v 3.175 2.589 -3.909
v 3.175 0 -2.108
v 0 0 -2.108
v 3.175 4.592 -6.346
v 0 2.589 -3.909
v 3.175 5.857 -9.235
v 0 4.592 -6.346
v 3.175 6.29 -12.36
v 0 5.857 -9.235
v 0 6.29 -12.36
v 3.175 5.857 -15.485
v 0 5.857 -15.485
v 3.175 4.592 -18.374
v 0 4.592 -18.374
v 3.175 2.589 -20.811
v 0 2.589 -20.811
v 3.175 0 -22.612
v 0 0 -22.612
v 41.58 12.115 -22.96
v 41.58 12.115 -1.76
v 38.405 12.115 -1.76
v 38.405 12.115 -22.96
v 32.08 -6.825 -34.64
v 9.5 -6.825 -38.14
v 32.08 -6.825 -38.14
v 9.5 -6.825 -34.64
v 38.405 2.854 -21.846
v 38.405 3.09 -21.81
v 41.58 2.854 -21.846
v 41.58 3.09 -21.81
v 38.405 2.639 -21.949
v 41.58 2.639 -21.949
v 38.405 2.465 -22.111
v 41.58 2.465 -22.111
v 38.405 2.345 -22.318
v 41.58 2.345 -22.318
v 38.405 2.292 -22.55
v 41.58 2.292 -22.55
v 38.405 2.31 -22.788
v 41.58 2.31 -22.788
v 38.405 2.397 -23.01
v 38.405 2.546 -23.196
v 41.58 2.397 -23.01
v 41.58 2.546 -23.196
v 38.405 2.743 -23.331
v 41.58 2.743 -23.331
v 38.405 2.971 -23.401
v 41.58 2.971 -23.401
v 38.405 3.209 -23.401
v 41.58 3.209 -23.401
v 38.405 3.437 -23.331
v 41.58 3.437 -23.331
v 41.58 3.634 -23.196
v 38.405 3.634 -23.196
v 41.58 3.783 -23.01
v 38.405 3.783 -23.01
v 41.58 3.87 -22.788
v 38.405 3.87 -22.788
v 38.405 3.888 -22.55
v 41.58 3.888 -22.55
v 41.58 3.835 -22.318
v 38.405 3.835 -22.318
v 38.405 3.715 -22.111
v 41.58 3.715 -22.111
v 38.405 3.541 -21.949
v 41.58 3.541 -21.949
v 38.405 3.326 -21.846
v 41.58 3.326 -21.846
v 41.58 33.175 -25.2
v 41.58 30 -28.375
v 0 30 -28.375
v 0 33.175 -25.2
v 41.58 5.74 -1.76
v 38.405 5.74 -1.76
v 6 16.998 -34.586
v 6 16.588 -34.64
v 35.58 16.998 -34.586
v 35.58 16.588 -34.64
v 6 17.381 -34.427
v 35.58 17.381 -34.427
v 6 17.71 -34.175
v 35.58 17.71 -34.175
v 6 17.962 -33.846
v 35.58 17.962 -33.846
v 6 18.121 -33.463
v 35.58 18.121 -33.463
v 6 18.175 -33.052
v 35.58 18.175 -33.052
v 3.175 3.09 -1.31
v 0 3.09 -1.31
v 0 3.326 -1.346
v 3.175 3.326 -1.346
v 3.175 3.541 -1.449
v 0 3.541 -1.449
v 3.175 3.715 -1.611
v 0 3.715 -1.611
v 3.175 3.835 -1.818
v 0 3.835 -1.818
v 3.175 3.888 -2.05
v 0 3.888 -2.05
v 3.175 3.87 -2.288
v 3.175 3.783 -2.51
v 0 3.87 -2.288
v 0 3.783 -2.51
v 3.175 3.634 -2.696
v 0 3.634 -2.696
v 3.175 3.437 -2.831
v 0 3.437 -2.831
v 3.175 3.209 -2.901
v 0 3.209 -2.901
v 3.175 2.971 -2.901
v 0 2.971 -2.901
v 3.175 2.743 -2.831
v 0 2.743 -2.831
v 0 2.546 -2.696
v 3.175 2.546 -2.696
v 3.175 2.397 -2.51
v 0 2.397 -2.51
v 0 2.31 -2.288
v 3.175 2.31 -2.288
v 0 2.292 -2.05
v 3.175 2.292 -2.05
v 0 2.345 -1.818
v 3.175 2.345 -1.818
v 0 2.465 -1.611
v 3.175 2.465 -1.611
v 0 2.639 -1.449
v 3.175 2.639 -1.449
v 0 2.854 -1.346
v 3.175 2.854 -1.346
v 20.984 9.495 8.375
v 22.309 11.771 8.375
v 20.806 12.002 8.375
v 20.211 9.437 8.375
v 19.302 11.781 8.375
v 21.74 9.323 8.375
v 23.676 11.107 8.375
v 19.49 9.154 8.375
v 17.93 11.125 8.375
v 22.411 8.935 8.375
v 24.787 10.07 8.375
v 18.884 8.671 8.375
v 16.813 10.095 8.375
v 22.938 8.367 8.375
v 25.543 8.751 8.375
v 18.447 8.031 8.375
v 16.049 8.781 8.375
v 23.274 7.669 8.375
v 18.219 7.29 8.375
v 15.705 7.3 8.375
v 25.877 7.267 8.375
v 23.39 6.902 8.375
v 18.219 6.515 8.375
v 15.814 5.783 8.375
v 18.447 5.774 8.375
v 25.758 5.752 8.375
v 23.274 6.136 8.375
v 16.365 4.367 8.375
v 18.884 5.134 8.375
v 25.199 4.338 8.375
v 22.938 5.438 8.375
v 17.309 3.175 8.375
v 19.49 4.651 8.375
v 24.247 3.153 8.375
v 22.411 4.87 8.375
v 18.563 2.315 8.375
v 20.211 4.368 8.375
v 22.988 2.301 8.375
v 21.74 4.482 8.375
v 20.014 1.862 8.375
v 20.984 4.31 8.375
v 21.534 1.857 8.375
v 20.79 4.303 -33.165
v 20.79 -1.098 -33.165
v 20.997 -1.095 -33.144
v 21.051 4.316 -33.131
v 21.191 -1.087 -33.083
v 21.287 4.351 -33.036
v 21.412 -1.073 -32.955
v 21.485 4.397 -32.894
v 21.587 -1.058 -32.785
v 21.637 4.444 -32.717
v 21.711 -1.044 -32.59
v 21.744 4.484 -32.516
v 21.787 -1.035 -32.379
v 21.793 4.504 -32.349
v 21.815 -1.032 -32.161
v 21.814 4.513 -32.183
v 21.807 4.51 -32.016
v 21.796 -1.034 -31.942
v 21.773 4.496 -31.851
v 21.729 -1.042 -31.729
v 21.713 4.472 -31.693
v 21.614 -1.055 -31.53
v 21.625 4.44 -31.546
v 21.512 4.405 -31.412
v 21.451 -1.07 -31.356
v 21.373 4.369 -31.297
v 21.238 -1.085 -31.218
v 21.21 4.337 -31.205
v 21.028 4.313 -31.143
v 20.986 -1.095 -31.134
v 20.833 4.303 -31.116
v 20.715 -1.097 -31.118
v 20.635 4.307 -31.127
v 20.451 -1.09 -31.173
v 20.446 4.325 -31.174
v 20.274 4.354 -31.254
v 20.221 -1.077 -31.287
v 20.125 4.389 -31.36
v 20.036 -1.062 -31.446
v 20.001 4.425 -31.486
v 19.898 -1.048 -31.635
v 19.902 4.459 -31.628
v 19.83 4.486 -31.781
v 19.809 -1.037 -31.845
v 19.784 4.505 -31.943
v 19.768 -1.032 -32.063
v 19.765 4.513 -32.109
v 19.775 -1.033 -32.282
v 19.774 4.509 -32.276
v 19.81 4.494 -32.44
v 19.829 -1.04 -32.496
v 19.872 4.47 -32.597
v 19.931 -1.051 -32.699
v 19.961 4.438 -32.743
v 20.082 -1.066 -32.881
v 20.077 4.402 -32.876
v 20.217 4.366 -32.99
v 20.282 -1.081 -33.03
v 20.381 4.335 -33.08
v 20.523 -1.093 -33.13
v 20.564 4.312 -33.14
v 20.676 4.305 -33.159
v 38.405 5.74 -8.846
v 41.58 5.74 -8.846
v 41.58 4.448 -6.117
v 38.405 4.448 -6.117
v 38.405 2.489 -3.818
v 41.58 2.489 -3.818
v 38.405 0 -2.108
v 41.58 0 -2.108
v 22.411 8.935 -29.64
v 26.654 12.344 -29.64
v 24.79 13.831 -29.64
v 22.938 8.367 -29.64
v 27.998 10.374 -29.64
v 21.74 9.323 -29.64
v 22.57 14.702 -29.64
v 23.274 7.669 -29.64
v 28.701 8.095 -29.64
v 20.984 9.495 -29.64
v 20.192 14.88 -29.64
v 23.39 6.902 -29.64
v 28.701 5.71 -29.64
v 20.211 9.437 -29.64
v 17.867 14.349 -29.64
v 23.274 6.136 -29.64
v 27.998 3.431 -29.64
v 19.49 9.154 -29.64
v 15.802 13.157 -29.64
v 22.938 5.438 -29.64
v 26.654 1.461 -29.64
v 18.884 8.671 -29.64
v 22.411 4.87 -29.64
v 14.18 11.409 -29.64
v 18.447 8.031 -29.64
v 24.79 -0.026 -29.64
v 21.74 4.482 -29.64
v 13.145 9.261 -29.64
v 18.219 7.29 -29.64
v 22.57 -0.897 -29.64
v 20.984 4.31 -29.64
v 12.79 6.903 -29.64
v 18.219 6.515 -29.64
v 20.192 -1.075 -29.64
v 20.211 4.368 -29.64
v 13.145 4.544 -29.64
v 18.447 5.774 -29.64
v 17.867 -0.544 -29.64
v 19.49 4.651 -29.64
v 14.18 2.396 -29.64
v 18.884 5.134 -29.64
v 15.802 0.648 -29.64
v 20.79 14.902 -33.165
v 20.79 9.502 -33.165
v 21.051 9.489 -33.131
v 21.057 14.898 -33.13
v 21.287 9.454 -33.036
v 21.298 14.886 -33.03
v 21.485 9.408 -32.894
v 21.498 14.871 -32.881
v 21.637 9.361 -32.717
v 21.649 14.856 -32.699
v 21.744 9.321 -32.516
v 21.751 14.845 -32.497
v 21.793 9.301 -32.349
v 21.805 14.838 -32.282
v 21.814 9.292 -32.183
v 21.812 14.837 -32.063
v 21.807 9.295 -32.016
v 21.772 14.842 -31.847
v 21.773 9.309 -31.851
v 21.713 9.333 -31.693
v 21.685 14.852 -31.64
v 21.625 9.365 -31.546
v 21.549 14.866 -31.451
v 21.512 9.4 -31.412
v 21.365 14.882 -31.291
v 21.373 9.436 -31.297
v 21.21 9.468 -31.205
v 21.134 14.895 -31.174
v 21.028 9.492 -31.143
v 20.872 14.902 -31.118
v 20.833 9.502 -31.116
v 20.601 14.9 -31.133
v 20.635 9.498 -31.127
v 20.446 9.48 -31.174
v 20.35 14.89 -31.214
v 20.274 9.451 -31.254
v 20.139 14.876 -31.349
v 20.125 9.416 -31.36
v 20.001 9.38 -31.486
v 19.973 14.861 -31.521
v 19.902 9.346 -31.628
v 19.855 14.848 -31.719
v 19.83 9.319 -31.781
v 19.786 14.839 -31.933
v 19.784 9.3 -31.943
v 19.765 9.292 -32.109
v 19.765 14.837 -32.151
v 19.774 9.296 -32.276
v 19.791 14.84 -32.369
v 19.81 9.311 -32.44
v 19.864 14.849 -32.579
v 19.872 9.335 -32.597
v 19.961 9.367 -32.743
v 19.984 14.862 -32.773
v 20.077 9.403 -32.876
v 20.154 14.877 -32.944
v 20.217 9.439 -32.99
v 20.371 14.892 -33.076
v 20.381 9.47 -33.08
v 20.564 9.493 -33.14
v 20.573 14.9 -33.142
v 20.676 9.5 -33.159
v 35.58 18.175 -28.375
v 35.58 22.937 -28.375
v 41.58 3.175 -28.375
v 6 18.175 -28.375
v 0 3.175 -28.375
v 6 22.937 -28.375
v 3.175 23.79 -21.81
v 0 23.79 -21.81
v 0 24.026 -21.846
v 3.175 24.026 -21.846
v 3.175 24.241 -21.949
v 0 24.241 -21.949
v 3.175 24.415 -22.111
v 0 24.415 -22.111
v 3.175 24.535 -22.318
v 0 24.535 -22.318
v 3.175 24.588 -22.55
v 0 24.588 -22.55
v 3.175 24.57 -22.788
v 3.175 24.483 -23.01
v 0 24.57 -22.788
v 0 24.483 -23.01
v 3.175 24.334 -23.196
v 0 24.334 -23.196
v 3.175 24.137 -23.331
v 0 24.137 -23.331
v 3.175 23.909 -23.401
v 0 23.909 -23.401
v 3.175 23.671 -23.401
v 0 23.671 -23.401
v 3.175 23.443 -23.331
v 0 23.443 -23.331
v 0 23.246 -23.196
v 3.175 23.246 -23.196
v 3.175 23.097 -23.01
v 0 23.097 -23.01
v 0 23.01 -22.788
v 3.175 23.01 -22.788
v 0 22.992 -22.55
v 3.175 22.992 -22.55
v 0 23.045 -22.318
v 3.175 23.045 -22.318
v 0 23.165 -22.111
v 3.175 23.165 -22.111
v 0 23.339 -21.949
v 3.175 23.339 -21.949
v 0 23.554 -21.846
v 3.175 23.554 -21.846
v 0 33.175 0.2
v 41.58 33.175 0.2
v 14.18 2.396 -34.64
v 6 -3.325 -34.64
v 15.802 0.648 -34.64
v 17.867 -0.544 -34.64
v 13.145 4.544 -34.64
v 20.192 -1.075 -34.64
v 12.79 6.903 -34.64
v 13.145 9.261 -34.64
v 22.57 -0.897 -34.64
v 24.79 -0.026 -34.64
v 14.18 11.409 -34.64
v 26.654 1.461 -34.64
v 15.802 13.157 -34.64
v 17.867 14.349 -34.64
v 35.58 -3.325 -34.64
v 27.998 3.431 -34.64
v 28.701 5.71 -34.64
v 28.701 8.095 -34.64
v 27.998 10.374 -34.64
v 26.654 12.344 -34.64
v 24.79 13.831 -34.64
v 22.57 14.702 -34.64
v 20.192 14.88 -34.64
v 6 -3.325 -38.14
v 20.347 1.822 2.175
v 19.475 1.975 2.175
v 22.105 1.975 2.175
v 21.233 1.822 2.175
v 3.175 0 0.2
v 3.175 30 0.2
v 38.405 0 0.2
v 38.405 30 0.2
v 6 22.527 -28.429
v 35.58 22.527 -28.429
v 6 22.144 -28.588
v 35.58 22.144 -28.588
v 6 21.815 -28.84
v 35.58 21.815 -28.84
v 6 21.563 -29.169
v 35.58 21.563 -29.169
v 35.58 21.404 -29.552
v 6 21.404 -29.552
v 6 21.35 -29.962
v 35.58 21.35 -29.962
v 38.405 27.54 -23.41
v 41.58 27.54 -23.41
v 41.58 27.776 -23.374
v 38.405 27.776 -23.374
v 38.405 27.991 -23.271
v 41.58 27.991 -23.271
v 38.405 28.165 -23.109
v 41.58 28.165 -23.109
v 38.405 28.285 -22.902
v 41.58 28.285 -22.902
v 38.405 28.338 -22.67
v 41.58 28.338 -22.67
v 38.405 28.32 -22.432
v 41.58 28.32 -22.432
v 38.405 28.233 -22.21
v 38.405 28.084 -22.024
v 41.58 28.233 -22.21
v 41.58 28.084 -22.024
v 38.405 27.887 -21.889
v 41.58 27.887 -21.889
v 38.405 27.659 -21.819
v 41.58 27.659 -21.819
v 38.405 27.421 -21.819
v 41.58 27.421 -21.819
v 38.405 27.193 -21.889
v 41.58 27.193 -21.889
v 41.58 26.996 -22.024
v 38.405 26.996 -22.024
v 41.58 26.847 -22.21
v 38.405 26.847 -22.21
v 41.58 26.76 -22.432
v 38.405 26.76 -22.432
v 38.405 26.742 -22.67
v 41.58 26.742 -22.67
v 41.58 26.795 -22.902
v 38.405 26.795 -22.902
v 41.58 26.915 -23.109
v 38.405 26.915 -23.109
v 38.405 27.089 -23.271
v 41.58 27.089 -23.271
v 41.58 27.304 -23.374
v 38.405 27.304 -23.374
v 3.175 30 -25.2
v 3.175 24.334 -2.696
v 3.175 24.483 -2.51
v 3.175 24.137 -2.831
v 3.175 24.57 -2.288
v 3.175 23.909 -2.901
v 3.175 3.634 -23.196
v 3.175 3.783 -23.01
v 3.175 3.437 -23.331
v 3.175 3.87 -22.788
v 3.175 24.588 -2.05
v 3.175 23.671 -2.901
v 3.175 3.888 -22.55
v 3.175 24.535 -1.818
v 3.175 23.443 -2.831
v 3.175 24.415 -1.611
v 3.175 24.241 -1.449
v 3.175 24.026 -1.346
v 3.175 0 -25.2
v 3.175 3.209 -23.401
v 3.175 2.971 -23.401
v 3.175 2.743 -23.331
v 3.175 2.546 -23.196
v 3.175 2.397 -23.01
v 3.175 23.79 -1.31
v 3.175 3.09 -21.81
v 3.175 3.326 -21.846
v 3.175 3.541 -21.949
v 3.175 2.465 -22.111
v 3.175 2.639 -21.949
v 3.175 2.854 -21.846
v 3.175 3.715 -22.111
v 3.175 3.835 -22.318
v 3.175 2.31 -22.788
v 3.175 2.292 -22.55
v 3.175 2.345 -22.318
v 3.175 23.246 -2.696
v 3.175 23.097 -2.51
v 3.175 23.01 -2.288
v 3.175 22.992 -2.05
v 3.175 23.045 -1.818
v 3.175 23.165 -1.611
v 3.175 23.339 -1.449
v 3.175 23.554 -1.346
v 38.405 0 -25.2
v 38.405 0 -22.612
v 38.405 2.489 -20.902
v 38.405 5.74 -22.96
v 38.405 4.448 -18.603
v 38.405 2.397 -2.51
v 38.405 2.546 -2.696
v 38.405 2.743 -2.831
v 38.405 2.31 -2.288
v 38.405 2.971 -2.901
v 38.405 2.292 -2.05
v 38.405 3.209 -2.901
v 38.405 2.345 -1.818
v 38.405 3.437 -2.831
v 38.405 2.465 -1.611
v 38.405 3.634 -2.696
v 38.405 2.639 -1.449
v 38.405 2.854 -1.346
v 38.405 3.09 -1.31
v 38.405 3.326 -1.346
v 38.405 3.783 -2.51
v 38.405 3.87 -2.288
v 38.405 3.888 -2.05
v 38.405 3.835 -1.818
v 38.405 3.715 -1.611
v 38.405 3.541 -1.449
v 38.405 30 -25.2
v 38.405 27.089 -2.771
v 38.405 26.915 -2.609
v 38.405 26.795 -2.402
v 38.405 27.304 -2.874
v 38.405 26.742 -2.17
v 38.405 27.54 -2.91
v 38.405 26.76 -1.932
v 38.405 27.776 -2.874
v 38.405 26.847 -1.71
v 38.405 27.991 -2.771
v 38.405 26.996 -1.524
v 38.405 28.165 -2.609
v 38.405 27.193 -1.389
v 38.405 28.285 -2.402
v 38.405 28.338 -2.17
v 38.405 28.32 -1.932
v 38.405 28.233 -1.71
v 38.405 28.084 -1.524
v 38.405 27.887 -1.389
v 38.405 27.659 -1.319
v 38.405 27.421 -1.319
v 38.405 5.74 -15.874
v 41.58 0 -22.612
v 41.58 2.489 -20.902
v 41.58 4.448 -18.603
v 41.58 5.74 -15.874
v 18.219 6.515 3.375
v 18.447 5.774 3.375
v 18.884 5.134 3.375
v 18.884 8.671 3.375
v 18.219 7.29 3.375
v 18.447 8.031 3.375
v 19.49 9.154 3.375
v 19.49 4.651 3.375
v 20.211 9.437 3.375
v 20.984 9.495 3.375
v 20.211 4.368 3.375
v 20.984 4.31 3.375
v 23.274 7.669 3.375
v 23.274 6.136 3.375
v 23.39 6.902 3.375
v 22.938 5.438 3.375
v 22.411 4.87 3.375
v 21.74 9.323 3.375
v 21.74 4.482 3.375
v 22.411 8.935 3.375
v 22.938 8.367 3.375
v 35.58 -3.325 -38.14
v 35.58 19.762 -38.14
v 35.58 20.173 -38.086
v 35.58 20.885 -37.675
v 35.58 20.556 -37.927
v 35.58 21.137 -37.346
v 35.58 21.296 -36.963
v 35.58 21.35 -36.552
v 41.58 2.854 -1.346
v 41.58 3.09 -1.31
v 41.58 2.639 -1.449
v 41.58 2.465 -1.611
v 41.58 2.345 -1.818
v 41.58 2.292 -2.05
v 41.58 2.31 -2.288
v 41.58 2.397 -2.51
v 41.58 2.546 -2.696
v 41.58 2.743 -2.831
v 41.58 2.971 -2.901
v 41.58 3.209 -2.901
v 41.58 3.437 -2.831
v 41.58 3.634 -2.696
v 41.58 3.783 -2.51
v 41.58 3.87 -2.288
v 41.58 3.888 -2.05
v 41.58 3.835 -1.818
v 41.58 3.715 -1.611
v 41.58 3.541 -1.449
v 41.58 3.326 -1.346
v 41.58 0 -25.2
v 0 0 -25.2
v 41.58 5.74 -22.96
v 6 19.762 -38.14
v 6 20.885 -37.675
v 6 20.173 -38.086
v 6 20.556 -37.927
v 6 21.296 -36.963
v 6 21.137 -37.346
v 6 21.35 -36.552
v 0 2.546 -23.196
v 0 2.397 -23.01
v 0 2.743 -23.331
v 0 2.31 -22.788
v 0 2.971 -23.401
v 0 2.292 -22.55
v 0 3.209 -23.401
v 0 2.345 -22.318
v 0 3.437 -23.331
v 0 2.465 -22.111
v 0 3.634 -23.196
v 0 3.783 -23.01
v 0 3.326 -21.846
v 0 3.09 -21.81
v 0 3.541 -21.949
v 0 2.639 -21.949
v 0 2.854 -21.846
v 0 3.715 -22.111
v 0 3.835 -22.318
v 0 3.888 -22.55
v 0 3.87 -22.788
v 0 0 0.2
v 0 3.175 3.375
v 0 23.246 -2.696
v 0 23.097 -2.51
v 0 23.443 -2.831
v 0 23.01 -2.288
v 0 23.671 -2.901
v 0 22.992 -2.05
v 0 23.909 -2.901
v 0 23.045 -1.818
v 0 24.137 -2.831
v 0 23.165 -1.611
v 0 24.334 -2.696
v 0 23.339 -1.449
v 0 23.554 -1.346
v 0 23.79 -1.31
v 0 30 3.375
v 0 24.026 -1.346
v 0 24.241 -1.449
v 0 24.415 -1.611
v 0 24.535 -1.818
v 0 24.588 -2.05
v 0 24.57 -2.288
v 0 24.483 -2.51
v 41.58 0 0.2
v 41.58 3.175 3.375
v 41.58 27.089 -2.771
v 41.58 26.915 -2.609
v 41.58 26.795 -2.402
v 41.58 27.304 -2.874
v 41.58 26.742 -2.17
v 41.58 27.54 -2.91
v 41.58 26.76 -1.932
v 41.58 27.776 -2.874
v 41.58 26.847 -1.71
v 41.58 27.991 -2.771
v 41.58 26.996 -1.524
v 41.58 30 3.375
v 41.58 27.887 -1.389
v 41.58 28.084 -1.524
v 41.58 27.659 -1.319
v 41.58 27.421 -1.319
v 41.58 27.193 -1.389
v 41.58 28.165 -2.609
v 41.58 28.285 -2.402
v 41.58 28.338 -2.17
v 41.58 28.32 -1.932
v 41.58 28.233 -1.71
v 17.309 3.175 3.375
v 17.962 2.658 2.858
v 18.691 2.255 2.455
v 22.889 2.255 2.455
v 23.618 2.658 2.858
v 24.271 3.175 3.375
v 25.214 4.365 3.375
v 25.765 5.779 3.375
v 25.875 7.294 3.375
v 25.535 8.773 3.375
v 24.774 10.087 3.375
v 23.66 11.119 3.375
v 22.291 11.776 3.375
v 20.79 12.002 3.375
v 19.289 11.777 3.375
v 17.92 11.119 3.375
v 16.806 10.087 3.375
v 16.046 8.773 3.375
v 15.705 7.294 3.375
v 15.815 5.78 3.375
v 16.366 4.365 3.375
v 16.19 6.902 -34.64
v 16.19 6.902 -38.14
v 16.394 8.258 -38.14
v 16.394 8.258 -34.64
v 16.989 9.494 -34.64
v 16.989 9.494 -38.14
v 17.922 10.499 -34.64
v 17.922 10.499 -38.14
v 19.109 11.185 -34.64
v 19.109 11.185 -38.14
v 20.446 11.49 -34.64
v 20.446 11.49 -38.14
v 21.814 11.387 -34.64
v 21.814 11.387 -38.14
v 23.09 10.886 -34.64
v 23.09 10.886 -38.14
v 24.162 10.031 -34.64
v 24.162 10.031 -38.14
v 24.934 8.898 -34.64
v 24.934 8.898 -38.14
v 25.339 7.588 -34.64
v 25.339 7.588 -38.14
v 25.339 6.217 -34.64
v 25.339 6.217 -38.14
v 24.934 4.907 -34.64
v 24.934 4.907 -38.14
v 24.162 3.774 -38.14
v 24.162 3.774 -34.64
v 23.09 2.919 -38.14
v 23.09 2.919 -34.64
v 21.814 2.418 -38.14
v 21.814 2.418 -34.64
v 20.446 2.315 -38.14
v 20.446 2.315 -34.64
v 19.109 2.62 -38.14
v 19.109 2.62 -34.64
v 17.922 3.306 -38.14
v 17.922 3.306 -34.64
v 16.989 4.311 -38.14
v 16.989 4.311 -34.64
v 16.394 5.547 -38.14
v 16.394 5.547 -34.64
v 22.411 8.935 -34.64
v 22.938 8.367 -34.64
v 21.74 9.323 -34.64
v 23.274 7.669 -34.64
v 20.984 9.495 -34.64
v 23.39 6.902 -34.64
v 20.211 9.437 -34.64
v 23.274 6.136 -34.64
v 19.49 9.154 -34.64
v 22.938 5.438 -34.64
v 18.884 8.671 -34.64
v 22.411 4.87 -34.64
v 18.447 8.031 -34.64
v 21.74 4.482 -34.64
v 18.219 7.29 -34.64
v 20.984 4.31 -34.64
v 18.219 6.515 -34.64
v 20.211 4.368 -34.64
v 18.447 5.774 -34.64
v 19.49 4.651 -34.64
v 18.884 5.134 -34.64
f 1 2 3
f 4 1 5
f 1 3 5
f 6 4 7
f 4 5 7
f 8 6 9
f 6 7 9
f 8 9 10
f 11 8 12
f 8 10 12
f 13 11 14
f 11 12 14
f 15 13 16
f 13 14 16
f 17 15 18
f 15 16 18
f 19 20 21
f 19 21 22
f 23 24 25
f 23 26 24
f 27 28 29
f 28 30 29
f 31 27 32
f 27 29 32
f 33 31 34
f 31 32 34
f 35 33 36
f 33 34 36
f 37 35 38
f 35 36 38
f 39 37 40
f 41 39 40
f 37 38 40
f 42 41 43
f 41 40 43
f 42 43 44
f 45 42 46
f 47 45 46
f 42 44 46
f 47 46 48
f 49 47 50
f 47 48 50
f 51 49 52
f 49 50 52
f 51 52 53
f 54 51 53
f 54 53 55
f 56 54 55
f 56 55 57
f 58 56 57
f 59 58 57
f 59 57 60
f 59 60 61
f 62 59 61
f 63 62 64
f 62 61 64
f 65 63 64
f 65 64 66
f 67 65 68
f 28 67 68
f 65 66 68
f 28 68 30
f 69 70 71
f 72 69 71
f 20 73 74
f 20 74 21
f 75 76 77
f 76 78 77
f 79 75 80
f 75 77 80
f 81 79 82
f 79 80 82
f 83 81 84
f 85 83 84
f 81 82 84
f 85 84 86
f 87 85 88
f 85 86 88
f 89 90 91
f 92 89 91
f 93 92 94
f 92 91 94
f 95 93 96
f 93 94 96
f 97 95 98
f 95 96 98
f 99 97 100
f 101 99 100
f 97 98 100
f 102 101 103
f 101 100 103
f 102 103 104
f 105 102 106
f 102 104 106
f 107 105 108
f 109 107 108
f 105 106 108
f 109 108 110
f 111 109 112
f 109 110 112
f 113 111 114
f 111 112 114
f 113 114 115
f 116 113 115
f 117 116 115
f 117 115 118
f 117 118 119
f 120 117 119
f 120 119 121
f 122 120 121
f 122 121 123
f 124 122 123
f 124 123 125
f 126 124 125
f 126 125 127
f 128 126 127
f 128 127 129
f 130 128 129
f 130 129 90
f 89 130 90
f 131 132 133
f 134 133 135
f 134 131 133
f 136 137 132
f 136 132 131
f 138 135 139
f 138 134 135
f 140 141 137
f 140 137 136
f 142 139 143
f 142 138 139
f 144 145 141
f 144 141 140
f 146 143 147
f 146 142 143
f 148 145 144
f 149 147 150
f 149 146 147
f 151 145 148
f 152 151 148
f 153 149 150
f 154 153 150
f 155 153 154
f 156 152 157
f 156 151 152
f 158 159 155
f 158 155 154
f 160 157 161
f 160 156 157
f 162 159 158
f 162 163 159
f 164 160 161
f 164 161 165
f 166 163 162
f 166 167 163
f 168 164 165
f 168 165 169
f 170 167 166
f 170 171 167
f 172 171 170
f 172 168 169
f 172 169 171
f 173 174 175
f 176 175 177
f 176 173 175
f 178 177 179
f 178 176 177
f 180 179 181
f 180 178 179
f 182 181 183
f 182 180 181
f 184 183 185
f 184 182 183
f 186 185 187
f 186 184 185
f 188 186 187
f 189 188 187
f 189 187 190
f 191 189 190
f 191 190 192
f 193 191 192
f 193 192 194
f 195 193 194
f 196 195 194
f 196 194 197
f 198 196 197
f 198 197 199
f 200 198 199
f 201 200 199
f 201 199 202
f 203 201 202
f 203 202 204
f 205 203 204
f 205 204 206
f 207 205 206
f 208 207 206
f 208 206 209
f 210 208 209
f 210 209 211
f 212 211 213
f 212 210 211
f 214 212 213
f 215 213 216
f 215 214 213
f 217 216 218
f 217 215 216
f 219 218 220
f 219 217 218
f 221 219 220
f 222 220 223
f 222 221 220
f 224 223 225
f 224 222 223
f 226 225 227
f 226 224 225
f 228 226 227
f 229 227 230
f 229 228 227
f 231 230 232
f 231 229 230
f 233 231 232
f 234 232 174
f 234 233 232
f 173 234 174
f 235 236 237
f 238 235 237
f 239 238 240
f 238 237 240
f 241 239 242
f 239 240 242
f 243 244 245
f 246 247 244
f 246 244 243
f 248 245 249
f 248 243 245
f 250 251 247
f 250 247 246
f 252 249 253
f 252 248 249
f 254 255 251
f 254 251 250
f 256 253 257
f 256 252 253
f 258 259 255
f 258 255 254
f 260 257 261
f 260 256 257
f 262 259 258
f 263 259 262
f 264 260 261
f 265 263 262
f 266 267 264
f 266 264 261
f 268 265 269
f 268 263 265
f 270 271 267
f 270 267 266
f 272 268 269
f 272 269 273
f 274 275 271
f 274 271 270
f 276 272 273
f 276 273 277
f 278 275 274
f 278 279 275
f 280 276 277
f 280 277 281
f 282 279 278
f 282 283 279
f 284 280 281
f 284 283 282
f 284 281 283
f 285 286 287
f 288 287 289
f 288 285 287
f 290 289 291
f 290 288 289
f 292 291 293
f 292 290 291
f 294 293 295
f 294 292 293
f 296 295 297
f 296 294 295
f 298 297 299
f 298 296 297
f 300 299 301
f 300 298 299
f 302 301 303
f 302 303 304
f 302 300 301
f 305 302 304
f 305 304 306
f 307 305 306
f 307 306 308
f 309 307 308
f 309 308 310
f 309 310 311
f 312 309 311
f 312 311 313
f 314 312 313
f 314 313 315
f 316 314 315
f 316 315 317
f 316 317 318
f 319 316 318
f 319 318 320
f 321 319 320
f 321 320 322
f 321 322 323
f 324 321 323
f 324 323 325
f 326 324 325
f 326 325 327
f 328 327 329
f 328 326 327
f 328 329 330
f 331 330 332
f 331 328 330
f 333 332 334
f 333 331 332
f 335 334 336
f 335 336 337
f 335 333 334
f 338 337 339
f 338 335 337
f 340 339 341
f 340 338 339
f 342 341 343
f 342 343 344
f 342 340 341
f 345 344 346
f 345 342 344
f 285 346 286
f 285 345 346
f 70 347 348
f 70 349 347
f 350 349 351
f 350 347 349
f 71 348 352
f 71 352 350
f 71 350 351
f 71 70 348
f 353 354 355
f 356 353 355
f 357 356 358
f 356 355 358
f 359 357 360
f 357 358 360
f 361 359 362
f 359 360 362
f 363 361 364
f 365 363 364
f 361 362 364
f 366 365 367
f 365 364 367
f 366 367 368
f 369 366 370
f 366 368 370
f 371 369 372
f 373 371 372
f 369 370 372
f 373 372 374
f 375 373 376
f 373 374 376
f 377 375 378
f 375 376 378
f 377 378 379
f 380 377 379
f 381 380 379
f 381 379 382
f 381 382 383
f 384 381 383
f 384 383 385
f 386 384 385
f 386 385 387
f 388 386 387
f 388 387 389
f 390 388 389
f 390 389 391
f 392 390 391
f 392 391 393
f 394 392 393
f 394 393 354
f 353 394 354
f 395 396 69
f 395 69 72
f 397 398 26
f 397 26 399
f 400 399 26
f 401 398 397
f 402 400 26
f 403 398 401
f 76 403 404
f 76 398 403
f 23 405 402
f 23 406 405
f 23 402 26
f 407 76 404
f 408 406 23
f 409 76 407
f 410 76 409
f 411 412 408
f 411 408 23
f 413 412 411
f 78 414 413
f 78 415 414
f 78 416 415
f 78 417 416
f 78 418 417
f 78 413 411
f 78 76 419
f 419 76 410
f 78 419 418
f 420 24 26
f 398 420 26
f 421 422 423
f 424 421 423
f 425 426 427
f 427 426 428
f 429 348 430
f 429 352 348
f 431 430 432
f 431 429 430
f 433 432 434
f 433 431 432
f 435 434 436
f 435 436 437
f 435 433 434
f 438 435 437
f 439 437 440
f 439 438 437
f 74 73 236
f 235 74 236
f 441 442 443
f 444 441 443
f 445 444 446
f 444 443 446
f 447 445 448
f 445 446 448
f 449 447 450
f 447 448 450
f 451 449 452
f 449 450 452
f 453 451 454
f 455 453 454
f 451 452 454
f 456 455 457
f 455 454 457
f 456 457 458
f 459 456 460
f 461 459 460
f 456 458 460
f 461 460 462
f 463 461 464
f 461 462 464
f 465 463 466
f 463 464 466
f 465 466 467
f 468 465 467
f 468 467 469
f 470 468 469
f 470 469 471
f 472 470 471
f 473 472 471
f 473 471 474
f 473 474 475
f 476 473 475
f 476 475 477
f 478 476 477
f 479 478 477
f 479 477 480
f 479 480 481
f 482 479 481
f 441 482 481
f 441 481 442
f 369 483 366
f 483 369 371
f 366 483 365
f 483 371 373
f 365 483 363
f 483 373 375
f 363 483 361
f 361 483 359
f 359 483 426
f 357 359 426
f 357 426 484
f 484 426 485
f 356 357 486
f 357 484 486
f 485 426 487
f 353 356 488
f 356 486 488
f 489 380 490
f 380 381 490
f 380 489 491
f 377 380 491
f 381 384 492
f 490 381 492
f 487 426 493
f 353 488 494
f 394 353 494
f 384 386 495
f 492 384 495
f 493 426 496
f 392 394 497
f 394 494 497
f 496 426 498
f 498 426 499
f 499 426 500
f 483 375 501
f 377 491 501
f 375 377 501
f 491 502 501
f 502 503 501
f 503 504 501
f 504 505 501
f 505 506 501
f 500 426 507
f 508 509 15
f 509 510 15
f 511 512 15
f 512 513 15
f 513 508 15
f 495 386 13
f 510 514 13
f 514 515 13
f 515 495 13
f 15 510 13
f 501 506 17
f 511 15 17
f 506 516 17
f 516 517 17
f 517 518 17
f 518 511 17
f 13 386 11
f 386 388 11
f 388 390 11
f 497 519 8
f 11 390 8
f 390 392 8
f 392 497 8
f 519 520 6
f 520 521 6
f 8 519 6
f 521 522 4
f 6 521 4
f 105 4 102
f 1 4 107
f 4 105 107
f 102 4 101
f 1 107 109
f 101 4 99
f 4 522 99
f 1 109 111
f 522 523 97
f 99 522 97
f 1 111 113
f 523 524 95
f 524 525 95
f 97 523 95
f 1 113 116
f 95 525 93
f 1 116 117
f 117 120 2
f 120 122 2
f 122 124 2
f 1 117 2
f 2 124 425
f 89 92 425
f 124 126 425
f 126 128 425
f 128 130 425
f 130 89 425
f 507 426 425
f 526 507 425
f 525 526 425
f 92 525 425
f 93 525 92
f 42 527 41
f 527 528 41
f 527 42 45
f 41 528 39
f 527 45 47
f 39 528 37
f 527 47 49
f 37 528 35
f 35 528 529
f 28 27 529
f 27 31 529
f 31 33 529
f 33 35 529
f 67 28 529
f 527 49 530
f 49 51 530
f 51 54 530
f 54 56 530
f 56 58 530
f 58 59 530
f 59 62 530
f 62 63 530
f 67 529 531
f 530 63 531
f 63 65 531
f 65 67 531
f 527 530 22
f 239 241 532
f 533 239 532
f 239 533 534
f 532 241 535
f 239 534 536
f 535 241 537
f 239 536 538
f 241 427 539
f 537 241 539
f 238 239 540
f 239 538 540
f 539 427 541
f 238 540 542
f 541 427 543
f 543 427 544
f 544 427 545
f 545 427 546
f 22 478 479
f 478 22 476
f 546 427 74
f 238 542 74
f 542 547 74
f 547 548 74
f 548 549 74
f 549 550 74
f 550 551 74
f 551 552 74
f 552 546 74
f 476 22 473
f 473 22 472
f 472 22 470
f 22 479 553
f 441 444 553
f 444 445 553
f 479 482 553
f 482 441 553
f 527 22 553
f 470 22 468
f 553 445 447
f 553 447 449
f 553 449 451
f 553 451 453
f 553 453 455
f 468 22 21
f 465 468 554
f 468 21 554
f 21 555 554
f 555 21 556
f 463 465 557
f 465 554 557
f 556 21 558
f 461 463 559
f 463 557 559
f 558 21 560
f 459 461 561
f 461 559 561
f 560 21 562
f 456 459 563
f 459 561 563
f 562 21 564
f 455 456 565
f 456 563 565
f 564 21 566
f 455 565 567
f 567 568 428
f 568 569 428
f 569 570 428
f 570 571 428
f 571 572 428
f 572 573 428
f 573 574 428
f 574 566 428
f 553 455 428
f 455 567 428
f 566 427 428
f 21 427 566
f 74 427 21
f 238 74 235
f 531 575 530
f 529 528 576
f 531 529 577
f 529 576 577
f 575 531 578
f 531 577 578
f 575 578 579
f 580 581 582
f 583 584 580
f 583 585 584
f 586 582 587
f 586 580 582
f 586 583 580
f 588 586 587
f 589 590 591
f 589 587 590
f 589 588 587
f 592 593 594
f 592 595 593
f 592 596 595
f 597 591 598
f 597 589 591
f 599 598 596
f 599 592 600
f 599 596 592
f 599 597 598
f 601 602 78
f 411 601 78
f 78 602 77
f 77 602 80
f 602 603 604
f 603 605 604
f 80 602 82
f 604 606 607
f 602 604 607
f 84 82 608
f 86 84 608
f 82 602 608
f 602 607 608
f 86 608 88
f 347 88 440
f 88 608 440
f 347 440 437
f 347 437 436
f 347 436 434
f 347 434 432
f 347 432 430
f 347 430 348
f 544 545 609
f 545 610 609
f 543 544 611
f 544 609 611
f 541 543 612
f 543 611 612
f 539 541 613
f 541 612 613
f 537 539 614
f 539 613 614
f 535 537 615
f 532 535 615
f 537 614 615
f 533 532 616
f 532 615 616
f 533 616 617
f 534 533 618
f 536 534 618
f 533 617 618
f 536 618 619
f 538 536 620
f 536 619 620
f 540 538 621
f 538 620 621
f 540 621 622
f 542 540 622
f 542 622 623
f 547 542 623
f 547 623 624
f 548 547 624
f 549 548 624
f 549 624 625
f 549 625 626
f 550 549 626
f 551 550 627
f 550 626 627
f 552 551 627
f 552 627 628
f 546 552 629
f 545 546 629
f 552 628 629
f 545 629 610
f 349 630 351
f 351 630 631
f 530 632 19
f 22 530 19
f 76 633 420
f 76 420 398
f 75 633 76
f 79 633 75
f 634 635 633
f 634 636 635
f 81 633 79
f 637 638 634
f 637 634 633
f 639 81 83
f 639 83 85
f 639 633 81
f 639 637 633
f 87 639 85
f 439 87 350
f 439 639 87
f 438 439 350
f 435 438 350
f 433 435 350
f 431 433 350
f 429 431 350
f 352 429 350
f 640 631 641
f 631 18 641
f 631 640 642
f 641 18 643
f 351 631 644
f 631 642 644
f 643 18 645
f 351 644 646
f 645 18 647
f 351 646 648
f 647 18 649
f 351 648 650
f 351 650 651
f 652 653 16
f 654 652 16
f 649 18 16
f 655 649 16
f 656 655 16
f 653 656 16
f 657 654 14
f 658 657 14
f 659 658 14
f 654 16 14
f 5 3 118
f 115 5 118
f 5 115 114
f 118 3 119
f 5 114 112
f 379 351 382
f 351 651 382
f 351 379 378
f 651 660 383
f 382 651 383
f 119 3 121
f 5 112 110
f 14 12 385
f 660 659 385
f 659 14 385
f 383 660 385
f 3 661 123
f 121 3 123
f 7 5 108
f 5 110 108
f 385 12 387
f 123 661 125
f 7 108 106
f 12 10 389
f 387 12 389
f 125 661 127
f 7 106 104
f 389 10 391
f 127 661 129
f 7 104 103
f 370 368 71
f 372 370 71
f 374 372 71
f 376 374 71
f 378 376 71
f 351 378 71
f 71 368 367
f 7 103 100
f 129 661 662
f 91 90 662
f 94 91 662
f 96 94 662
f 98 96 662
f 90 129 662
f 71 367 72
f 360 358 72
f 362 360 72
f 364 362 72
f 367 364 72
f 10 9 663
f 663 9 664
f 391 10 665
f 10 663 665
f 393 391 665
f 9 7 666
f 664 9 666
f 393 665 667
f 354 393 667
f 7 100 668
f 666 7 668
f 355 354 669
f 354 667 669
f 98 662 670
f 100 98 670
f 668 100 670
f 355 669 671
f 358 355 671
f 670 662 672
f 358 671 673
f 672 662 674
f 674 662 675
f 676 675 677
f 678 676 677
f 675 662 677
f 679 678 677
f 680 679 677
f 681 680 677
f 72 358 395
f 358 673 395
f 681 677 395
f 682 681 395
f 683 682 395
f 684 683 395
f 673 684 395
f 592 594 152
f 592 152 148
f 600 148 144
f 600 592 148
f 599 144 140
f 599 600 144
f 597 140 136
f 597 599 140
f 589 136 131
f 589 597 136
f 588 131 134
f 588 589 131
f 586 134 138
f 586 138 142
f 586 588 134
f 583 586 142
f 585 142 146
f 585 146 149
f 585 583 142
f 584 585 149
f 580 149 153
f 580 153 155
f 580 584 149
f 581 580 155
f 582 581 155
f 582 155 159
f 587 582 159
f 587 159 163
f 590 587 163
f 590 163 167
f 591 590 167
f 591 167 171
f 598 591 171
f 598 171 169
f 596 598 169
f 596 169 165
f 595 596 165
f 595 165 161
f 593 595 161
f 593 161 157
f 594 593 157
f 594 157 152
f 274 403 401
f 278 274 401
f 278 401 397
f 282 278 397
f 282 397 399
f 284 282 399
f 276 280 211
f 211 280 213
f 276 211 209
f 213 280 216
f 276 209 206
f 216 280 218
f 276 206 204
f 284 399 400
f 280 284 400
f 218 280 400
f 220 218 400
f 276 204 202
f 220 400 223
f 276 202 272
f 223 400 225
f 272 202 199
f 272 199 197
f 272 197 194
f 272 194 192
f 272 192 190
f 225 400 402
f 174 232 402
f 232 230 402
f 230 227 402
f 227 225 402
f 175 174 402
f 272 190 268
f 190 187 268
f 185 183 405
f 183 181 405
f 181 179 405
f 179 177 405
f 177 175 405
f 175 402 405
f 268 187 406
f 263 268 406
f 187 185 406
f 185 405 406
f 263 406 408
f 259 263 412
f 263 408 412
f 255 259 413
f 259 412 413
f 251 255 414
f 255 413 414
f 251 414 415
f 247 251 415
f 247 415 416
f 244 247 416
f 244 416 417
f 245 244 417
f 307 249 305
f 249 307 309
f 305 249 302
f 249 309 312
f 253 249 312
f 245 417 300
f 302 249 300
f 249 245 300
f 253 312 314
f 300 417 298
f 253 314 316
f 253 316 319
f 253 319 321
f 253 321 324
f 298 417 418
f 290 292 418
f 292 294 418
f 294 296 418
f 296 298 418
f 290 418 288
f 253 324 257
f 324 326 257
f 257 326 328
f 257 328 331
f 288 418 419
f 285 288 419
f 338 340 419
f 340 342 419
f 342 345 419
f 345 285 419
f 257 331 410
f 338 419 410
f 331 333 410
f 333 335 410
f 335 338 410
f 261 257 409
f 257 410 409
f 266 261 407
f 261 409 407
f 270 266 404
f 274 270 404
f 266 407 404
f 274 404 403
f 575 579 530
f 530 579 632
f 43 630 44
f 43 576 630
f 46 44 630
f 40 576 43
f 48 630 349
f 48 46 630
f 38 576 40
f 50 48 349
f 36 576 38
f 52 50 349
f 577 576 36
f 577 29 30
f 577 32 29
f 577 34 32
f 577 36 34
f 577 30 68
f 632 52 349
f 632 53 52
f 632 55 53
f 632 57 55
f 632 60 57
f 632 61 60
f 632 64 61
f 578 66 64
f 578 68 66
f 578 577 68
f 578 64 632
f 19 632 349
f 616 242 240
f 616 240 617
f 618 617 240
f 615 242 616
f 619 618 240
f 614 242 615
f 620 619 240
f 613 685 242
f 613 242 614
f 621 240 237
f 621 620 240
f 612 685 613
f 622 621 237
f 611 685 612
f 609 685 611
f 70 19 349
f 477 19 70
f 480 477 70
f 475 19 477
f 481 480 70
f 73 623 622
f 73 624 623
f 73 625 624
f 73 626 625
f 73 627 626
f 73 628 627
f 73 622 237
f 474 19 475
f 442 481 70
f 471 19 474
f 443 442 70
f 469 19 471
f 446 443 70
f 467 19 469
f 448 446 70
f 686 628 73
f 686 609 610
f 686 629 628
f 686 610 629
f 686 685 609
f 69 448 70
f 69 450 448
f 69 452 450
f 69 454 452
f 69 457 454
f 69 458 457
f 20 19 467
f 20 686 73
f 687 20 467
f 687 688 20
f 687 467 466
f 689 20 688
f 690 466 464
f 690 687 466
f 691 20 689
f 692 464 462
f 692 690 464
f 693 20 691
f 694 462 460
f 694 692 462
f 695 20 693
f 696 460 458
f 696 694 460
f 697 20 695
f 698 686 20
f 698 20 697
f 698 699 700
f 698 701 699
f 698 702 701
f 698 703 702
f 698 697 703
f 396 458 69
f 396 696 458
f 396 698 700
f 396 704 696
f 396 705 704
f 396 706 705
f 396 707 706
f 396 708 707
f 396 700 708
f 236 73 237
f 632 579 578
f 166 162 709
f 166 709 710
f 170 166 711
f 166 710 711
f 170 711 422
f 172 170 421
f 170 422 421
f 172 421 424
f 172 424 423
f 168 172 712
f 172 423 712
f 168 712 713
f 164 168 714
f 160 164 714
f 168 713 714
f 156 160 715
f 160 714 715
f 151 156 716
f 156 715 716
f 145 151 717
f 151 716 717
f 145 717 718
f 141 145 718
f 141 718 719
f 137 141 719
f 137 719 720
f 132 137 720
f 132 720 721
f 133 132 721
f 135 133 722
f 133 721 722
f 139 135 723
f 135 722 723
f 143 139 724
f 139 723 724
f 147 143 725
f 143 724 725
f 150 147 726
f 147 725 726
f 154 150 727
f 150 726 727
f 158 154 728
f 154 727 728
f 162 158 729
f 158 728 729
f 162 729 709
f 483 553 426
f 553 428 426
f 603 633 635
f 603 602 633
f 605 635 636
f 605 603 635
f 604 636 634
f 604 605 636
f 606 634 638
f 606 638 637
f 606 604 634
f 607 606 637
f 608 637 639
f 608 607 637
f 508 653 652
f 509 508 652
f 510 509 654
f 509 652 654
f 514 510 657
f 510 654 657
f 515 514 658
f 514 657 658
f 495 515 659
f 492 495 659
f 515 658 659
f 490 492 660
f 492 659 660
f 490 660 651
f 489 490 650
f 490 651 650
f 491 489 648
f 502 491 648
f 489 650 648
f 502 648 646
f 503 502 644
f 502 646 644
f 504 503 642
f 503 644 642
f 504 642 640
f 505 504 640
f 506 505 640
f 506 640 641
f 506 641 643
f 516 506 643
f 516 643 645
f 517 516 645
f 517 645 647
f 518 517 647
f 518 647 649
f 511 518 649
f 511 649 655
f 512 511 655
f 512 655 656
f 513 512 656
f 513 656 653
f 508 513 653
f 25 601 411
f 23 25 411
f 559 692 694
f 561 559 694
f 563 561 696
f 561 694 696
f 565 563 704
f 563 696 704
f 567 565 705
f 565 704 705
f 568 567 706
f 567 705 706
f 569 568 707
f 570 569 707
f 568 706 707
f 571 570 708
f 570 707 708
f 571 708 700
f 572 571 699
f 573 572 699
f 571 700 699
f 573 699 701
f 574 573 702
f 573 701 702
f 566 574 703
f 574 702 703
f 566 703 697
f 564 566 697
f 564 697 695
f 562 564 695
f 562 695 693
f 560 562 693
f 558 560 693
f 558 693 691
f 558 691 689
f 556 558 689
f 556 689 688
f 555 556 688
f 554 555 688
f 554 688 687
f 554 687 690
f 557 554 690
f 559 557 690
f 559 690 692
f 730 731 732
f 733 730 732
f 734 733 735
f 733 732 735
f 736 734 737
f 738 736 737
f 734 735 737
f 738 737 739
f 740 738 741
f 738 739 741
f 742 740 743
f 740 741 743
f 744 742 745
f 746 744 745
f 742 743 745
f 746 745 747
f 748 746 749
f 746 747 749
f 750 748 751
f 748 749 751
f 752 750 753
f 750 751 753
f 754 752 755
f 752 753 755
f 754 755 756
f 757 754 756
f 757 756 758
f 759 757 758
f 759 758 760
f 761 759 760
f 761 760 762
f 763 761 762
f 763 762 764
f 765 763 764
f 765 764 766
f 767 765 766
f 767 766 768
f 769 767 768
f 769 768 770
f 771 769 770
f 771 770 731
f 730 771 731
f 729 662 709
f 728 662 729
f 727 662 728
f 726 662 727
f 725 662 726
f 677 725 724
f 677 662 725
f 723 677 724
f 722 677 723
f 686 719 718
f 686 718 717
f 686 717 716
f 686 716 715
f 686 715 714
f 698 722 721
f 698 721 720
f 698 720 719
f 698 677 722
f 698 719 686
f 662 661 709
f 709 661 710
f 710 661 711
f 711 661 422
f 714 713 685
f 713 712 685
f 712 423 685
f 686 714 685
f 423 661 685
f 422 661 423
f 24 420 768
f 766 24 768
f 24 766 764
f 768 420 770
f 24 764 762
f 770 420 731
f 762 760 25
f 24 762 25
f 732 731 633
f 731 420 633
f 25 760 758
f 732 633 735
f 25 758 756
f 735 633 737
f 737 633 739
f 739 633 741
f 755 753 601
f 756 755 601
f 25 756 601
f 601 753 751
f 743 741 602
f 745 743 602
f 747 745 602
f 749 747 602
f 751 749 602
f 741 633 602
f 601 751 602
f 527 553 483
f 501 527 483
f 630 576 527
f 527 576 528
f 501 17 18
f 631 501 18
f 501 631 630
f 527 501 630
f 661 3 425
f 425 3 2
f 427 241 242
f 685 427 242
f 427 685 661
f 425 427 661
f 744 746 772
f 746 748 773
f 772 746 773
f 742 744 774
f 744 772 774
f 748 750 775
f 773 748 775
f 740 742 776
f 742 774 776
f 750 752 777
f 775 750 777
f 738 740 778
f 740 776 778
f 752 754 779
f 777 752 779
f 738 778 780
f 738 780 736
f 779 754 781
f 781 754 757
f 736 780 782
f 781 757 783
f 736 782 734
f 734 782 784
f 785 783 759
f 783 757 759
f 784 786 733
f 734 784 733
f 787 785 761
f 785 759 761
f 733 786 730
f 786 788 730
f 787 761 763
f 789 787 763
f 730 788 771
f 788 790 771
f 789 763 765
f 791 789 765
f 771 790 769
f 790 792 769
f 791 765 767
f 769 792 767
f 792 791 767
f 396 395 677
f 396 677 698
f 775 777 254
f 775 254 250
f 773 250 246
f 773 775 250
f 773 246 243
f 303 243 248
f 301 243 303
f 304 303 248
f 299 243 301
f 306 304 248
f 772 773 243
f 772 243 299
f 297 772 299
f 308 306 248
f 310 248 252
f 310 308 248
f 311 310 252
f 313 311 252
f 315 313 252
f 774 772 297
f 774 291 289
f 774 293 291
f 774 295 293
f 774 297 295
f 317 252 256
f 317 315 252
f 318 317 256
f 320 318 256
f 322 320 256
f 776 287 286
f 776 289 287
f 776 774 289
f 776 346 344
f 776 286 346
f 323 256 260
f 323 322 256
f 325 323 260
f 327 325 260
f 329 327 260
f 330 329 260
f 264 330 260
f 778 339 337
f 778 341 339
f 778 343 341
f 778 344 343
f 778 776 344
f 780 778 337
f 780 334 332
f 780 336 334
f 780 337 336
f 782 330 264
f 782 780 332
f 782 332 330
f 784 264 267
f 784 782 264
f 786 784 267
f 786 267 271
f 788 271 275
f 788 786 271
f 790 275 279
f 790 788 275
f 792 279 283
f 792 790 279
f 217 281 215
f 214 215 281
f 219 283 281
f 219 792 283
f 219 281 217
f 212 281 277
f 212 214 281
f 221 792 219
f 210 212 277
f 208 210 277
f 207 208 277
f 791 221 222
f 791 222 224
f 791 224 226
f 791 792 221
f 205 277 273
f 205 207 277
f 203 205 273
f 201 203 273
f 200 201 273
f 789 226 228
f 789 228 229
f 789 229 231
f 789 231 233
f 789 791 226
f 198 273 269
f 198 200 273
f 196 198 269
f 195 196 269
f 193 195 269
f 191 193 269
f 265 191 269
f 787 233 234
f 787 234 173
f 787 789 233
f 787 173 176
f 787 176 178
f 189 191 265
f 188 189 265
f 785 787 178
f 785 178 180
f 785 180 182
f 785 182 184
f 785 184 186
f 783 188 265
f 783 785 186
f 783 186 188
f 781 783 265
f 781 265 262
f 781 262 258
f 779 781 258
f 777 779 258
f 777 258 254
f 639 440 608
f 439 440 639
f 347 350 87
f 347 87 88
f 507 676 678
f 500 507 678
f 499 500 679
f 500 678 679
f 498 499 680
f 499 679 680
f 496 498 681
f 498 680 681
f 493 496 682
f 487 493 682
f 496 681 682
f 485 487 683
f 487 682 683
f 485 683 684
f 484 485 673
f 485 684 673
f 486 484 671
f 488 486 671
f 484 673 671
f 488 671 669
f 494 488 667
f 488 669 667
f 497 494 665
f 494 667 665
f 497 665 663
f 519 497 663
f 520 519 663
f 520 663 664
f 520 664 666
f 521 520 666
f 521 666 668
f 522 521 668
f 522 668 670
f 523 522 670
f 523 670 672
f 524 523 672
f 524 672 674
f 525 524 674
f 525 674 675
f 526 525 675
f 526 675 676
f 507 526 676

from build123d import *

# Parameters (mm, degrees)
SKETCH1_W                       = 25
SKETCH1_H                       = 30
BOSS_EXTRUDE1_DEPTH             = 3.175
SKETCH2_W                       = 25
SKETCH2_H                       = 3.175
BOSS_EXTRUDE2_DEPTH             = 41.58
SKETCH3_W                       = 3.175
SKETCH3_H                       = 25
BOSS_EXTRUDE3_DEPTH             = 30
CUT_EXTRUDE1_REACH              = 60.775
SKETCH4_R                       = 11.5
CUT_EXTRUDE2_REACH              = 60.775
SKETCH5_R                       = 0.8
CUT_EXTRUDE3_REACH              = 60.775
SKETCH6_R                       = 0.8
SKETCH6_R_2                     = 0.799851166
SKETCH6_W                       = 21.2
SKETCH6_H                       = 6.375
CUT_EXTRUDE4_REACH              = 60.775
SKETCH7_R                       = 11.5
BOSS_EXTRUDE4_DEPTH             = 0.2
SKETCH9_W                       = 41.58
SKETCH9_H                       = 33.175
BOSS_EXTRUDE5_DEPTH             = 3.175
BOSS_EXTRUDE6_DEPTH             = 0.2
SKETCH11_W                      = 41.58
SKETCH11_H                      = 33.175
BOSS_EXTRUDE7_DEPTH             = 3.175
CHAMFER1_SIZE                   = 3.175
CHAMFER2_SIZE                   = 3.175
SKETCH13_W                      = 29.58
SKETCH13_H                      = 3.175
BOSS_EXTRUDE8_DEPTH             = 6.59
BOSS_EXTRUDE9_REACH             = 59.287
SKETCH14_W                      = 29.58
SKETCH14_H                      = 3.5
BOSS_EXTRUDE9_DIRECTION_2_DEPTH = 25
CHAMFER3_SIZE                   = 3.5
FILLET1_R                       = 1.5875
FILLET2_R                       = 1.5875
CUT_EXTRUDE5_REACH              = 69.476
SKETCH16_R                      = 4.6
SKETCH20_R                      = 8
SKETCH20_R_2                    = 2.6
BOSS_EXTRUDE11_DEPTH            = 5
CUT_EXTRUDE6_START              = -21.7275
SKETCH21_R                      = 1.025
CUT_EXTRUDE6_DEPTH              = 16
BOSS_EXTRUDE12_DEPTH            = 5
BOSS_EXTRUDE12_DEPTH_BACK       = 1.2
SKETCH23_R                      = 5.1
SKETCH23_R_2                    = 2.6


with BuildPart() as part:
    # Sketch1 → Boss-Extrude1 (new body)
    with BuildSketch(Plane(origin=(0, 0, 0), x_dir=(0, 0, -1), z_dir=(1, 0, 0))):
        with Locations((12.5, 15)):
            Rectangle(SKETCH1_W, SKETCH1_H)
    extrude(amount=BOSS_EXTRUDE1_DEPTH)

    # Sketch2 → Boss-Extrude2 (add)
    with BuildSketch(Plane.ZY):
        with Locations((-12.5, 31.5875)):
            Rectangle(SKETCH2_W, SKETCH2_H)
    extrude(amount=-BOSS_EXTRUDE2_DEPTH)

    # Sketch3 → Boss-Extrude3 (add)
    with BuildSketch(Plane.XZ.offset(-30)):
        with Locations((39.9925, -12.5)):
            Rectangle(SKETCH3_W, SKETCH3_H)
    extrude(amount=BOSS_EXTRUDE3_DEPTH)

    # Sketch4 → Cut-Extrude1 (cut, up to next)
    with BuildSketch(Plane.ZY, mode=Mode.PRIVATE) as cut_extrude1_sk1:
        with Locations((-12.359999929, -5.209996254)):
            Circle(SKETCH4_R)
    cut_extrude1_tool1 = extrude(cut_extrude1_sk1.sketch, amount=-CUT_EXTRUDE1_REACH, mode=Mode.PRIVATE) & part.part
    add(cut_extrude1_tool1.solids().sort_by_distance((0, -5.209996, -12.36))[0], mode=Mode.SUBTRACT)

    # Sketch5 → Cut-Extrude2 (cut, up to next)
    with BuildSketch(Plane.ZY, mode=Mode.PRIVATE) as cut_extrude2_sk1:
        with Locations((-22.609999929, 3.090003746)):
            Circle(SKETCH5_R)
    cut_extrude2_tool1 = extrude(cut_extrude2_sk1.sketch, amount=-CUT_EXTRUDE2_REACH, mode=Mode.PRIVATE) & part.part
    # Sketch5 → Cut-Extrude2 (cut, up to next)
    with BuildSketch(Plane.ZY, mode=Mode.PRIVATE) as cut_extrude2_sk2:
        with Locations((-22.609999929, 23.790003746)):
            Circle(SKETCH5_R)
    cut_extrude2_tool2 = extrude(cut_extrude2_sk2.sketch, amount=-CUT_EXTRUDE2_REACH, mode=Mode.PRIVATE) & part.part
    # Sketch5 → Cut-Extrude2 (cut, up to next)
    with BuildSketch(Plane.ZY, mode=Mode.PRIVATE) as cut_extrude2_sk3:
        with Locations((-2.109999929, 23.790003746)):
            Circle(SKETCH5_R)
    cut_extrude2_tool3 = extrude(cut_extrude2_sk3.sketch, amount=-CUT_EXTRUDE2_REACH, mode=Mode.PRIVATE) & part.part
    # Sketch5 → Cut-Extrude2 (cut, up to next)
    with BuildSketch(Plane.ZY, mode=Mode.PRIVATE) as cut_extrude2_sk4:
        with Locations((-2.109999929, 3.090003746)):
            Circle(SKETCH5_R)
    cut_extrude2_tool4 = extrude(cut_extrude2_sk4.sketch, amount=-CUT_EXTRUDE2_REACH, mode=Mode.PRIVATE) & part.part
    add(cut_extrude2_tool1.solids().sort_by_distance((0, 3.090004, -22.61))[0], mode=Mode.SUBTRACT)
    add(cut_extrude2_tool2.solids().sort_by_distance((0, 23.790004, -22.61))[0], mode=Mode.SUBTRACT)
    add(cut_extrude2_tool3.solids().sort_by_distance((0, 23.790004, -2.11))[0], mode=Mode.SUBTRACT)
    add(cut_extrude2_tool4.solids().sort_by_distance((0, 3.090004, -2.11))[0], mode=Mode.SUBTRACT)

    # Sketch6 → Cut-Extrude3 (cut, up to next)
    with BuildSketch(Plane(origin=(41.58, 0, 0), x_dir=(0, 0, -1), z_dir=(1, 0, 0)), mode=Mode.PRIVATE) as cut_extrude3_sk1:
        with Locations(Location((2.109999929, 3.090003746, 0), (0, 0, 180))):
            Circle(SKETCH6_R)
    cut_extrude3_tool1 = extrude(cut_extrude3_sk1.sketch, amount=-CUT_EXTRUDE3_REACH, mode=Mode.PRIVATE) & part.part
    # Sketch6 → Cut-Extrude3 (cut, up to next)
    with BuildSketch(Plane(origin=(41.58, 0, 0), x_dir=(0, 0, -1), z_dir=(1, 0, 0)), mode=Mode.PRIVATE) as cut_extrude3_sk2:
        with Locations(Location((22.609999929, 3.090003746, 0), (0, 0, 180))):
            Circle(SKETCH6_R)
    cut_extrude3_tool2 = extrude(cut_extrude3_sk2.sketch, amount=-CUT_EXTRUDE3_REACH, mode=Mode.PRIVATE) & part.part
    # Sketch6 → Cut-Extrude3 (cut, up to next)
    with BuildSketch(Plane(origin=(41.58, 0, 0), x_dir=(0, 0, -1), z_dir=(1, 0, 0)), mode=Mode.PRIVATE) as cut_extrude3_sk3:
        with Locations((22.609999929, 27.540003746)):
            Circle(SKETCH6_R_2)
    cut_extrude3_tool3 = extrude(cut_extrude3_sk3.sketch, amount=-CUT_EXTRUDE3_REACH, mode=Mode.PRIVATE) & part.part
    # Sketch6 → Cut-Extrude3 (cut, up to next)
    with BuildSketch(Plane(origin=(41.58, 0, 0), x_dir=(0, 0, -1), z_dir=(1, 0, 0)), mode=Mode.PRIVATE) as cut_extrude3_sk4:
        with Locations((2.109999929, 27.540003746)):
            Circle(SKETCH6_R)
    cut_extrude3_tool4 = extrude(cut_extrude3_sk4.sketch, amount=-CUT_EXTRUDE3_REACH, mode=Mode.PRIVATE) & part.part
    # Sketch6 → Cut-Extrude3 (cut, up to next)
    with BuildSketch(Plane(origin=(41.58, 0, 0), x_dir=(0, 0, -1), z_dir=(1, 0, 0)), mode=Mode.PRIVATE) as cut_extrude3_sk5:
        with Locations((12.359999929, 8.927503746)):
            Rectangle(SKETCH6_W, SKETCH6_H)
    cut_extrude3_tool5 = extrude(cut_extrude3_sk5.sketch, amount=-CUT_EXTRUDE3_REACH, mode=Mode.PRIVATE) & part.part
    add(cut_extrude3_tool1.solids().sort_by_distance((41.58, 3.090004, -2.11))[0], mode=Mode.SUBTRACT)
    add(cut_extrude3_tool2.solids().sort_by_distance((41.58, 3.090004, -22.61))[0], mode=Mode.SUBTRACT)
    add(cut_extrude3_tool3.solids().sort_by_distance((41.58, 27.540004, -22.61))[0], mode=Mode.SUBTRACT)
    add(cut_extrude3_tool4.solids().sort_by_distance((41.58, 27.540004, -2.11))[0], mode=Mode.SUBTRACT)
    add(cut_extrude3_tool5.solids().sort_by_distance((41.58, 8.927504, -12.36))[0], mode=Mode.SUBTRACT)

    # Sketch7 → Cut-Extrude4 (cut, up to next)
    with BuildSketch(Plane(origin=(41.58, 0, 0), x_dir=(0, 0, -1), z_dir=(1, 0, 0)), mode=Mode.PRIVATE) as cut_extrude4_sk1:
        with Locations((12.359999929, -5.209996254)):
            Circle(SKETCH7_R)
    cut_extrude4_tool1 = extrude(cut_extrude4_sk1.sketch, amount=-CUT_EXTRUDE4_REACH, mode=Mode.PRIVATE) & part.part
    add(cut_extrude4_tool1.solids().sort_by_distance((41.58, -5.209996, -12.36))[0], mode=Mode.SUBTRACT)

    # Sketch8 → Boss-Extrude4 (add)
    with BuildSketch(Plane.XY):
        Polygon((0, 33.175), (0, 0), (3.175, 0), (3.175, 30), (38.405, 30), (38.405, 0), (41.58, 0), (41.58, 33.175), align=None)
    extrude(amount=BOSS_EXTRUDE4_DEPTH)

    # Sketch9 → Boss-Extrude5 (add)
    with BuildSketch(Plane.XY.offset(0.2)):
        with Locations((20.79, 16.5875)):
            Rectangle(SKETCH9_W, SKETCH9_H)
    extrude(amount=BOSS_EXTRUDE5_DEPTH)

    # Sketch10 → Boss-Extrude6 (add)
    with BuildSketch(Plane(origin=(0, 0, -25), x_dir=(-1, 0, 0), z_dir=(0, 0, -1))):
        Polygon((0, 0), (0, 33.175), (-41.58, 33.175), (-41.58, 0), (-38.405, 0), (-38.405, 30), (-3.175, 30), (-3.175, 0), align=None)
    extrude(amount=BOSS_EXTRUDE6_DEPTH)

    # Sketch11 → Boss-Extrude7 (add)
    with BuildSketch(Plane(origin=(0, 0, -25.2), x_dir=(-1, 0, 0), z_dir=(0, 0, -1))):
        with Locations((-20.79, 16.5875)):
            Rectangle(SKETCH11_W, SKETCH11_H)
    extrude(amount=BOSS_EXTRUDE7_DEPTH)

    # Chamfer1
    chamfer1_edges = [part.edges().sort_by_distance(p)[0] for p in [
        (20.79, 33.175, 3.375),
        (20.79, 33.175, -28.375),
    ]]
    chamfer(chamfer1_edges, length=CHAMFER1_SIZE)

    # Chamfer2
    chamfer2_edges = [part.edges().sort_by_distance(p)[0] for p in [
        (20.79, 0, 3.375),
        (20.79, 0, -28.375),
    ]]
    chamfer(chamfer2_edges, length=CHAMFER2_SIZE - 0.0001)  # a hair under: the kernel refuses the full size

    # Sketch13 → Boss-Extrude8 (add)
    with BuildSketch(Plane(origin=(0, 0, -28.375), x_dir=(-1, 0, 0), z_dir=(0, 0, -1))):
        with Locations((-20.79, 19.7625)):
            Rectangle(SKETCH13_W, SKETCH13_H)
    extrude(amount=BOSS_EXTRUDE8_DEPTH)

    # Boss-Extrude9: up to this face of the body (flat: up to its plane)
    boss_extrude9_end = Plane(part.part.faces().sort_by_distance((20.79, 21.35, -31.67))[0])
    # Sketch14 → Boss-Extrude9 (add, up to the picked face)
    with BuildSketch(Plane.XZ.offset(-18.175), mode=Mode.PRIVATE) as boss_extrude9_sk1:
        with Locations((20.79, -36.39)):
            Rectangle(SKETCH14_W, SKETCH14_H)
    boss_extrude9_tool1 = split(extrude(boss_extrude9_sk1.sketch, amount=-BOSS_EXTRUDE9_REACH, mode=Mode.PRIVATE), bisect_by=boss_extrude9_end, keep=Keep.BOTH, mode=Mode.PRIVATE)
    add(boss_extrude9_tool1.solids().sort_by(Axis((20.79, 18.175, -36.39), (0, 1, 0)))[0])

    # Sketch14 → Boss-Extrude9 direction 2 (add)
    with BuildSketch(Plane.XZ.offset(-18.175)):
        with Locations((20.79, -36.39)):
            Rectangle(SKETCH14_W, SKETCH14_H)
    extrude(amount=BOSS_EXTRUDE9_DIRECTION_2_DEPTH)

    # Chamfer3
    chamfer3_edges = [part.edges().sort_by_distance(p)[0] for p in [
        (6, -6.825, -36.39),
        (35.58, -6.825, -36.39),
    ]]
    chamfer(chamfer3_edges, length=CHAMFER3_SIZE)

    # Fillet1
    fillet1_edges = [part.edges().sort_by_distance(p)[0] for p in [
        (20.79, 18.175, -34.64),
        (20.79, 21.35, -38.14),
    ]]
    fillet(fillet1_edges, radius=FILLET1_R)

    # Fillet2
    fillet2_edges = [part.edges().sort_by_distance(p)[0] for p in [
        (20.79, 21.35, -28.375),
    ]]
    fillet(fillet2_edges, radius=FILLET2_R)

    # Sketch16 → Cut-Extrude5 (cut, up to next)
    with BuildSketch(Plane(origin=(0, 0, -38.14), x_dir=(-1, 0, 0), z_dir=(0, 0, -1)), mode=Mode.PRIVATE) as cut_extrude5_sk1:
        with Locations((-20.79, 6.9025)):
            Circle(SKETCH16_R)
    cut_extrude5_tool1 = extrude(cut_extrude5_sk1.sketch, amount=-CUT_EXTRUDE5_REACH, mode=Mode.PRIVATE) & part.part
    add(cut_extrude5_tool1.solids().sort_by_distance((20.79, 6.9025, -38.14))[0], mode=Mode.SUBTRACT)

    # Sketch20 → Boss-Extrude11 (add)
    with BuildSketch(Plane.XY.offset(-34.64)):
        with Locations(Location((20.79, 6.9025, 0), (0, 0, 180))):
            Circle(SKETCH20_R)
        with Locations((20.79, 6.9025)):
            Circle(SKETCH20_R_2, mode=Mode.SUBTRACT)
    extrude(amount=BOSS_EXTRUDE11_DEPTH)

    # Sketch21 → Cut-Extrude6 (cut)
    with BuildSketch(Plane.XZ.offset(6.825).offset(CUT_EXTRUDE6_START)):
        with Locations(Location((20.79, -32.14, 0), (0, 0, 270))):
            Circle(SKETCH21_R)
    extrude(amount=CUT_EXTRUDE6_DEPTH, mode=Mode.SUBTRACT)

    # Sketch23 → Boss-Extrude12 (add, two sides: drawn at the far end of the back side and taken through both)
    with BuildSketch(Plane.XY.offset(3.375).offset(-BOSS_EXTRUDE12_DEPTH_BACK)):
        with Locations(Location((20.79, 6.9025, 0), (0, 0, 226.960415899))):
            Circle(SKETCH23_R)
        with Locations((20.79, 6.9025)):
            Circle(SKETCH23_R_2, mode=Mode.SUBTRACT)
    extrude(amount=BOSS_EXTRUDE12_DEPTH + BOSS_EXTRUDE12_DEPTH_BACK)


solid = part.part
